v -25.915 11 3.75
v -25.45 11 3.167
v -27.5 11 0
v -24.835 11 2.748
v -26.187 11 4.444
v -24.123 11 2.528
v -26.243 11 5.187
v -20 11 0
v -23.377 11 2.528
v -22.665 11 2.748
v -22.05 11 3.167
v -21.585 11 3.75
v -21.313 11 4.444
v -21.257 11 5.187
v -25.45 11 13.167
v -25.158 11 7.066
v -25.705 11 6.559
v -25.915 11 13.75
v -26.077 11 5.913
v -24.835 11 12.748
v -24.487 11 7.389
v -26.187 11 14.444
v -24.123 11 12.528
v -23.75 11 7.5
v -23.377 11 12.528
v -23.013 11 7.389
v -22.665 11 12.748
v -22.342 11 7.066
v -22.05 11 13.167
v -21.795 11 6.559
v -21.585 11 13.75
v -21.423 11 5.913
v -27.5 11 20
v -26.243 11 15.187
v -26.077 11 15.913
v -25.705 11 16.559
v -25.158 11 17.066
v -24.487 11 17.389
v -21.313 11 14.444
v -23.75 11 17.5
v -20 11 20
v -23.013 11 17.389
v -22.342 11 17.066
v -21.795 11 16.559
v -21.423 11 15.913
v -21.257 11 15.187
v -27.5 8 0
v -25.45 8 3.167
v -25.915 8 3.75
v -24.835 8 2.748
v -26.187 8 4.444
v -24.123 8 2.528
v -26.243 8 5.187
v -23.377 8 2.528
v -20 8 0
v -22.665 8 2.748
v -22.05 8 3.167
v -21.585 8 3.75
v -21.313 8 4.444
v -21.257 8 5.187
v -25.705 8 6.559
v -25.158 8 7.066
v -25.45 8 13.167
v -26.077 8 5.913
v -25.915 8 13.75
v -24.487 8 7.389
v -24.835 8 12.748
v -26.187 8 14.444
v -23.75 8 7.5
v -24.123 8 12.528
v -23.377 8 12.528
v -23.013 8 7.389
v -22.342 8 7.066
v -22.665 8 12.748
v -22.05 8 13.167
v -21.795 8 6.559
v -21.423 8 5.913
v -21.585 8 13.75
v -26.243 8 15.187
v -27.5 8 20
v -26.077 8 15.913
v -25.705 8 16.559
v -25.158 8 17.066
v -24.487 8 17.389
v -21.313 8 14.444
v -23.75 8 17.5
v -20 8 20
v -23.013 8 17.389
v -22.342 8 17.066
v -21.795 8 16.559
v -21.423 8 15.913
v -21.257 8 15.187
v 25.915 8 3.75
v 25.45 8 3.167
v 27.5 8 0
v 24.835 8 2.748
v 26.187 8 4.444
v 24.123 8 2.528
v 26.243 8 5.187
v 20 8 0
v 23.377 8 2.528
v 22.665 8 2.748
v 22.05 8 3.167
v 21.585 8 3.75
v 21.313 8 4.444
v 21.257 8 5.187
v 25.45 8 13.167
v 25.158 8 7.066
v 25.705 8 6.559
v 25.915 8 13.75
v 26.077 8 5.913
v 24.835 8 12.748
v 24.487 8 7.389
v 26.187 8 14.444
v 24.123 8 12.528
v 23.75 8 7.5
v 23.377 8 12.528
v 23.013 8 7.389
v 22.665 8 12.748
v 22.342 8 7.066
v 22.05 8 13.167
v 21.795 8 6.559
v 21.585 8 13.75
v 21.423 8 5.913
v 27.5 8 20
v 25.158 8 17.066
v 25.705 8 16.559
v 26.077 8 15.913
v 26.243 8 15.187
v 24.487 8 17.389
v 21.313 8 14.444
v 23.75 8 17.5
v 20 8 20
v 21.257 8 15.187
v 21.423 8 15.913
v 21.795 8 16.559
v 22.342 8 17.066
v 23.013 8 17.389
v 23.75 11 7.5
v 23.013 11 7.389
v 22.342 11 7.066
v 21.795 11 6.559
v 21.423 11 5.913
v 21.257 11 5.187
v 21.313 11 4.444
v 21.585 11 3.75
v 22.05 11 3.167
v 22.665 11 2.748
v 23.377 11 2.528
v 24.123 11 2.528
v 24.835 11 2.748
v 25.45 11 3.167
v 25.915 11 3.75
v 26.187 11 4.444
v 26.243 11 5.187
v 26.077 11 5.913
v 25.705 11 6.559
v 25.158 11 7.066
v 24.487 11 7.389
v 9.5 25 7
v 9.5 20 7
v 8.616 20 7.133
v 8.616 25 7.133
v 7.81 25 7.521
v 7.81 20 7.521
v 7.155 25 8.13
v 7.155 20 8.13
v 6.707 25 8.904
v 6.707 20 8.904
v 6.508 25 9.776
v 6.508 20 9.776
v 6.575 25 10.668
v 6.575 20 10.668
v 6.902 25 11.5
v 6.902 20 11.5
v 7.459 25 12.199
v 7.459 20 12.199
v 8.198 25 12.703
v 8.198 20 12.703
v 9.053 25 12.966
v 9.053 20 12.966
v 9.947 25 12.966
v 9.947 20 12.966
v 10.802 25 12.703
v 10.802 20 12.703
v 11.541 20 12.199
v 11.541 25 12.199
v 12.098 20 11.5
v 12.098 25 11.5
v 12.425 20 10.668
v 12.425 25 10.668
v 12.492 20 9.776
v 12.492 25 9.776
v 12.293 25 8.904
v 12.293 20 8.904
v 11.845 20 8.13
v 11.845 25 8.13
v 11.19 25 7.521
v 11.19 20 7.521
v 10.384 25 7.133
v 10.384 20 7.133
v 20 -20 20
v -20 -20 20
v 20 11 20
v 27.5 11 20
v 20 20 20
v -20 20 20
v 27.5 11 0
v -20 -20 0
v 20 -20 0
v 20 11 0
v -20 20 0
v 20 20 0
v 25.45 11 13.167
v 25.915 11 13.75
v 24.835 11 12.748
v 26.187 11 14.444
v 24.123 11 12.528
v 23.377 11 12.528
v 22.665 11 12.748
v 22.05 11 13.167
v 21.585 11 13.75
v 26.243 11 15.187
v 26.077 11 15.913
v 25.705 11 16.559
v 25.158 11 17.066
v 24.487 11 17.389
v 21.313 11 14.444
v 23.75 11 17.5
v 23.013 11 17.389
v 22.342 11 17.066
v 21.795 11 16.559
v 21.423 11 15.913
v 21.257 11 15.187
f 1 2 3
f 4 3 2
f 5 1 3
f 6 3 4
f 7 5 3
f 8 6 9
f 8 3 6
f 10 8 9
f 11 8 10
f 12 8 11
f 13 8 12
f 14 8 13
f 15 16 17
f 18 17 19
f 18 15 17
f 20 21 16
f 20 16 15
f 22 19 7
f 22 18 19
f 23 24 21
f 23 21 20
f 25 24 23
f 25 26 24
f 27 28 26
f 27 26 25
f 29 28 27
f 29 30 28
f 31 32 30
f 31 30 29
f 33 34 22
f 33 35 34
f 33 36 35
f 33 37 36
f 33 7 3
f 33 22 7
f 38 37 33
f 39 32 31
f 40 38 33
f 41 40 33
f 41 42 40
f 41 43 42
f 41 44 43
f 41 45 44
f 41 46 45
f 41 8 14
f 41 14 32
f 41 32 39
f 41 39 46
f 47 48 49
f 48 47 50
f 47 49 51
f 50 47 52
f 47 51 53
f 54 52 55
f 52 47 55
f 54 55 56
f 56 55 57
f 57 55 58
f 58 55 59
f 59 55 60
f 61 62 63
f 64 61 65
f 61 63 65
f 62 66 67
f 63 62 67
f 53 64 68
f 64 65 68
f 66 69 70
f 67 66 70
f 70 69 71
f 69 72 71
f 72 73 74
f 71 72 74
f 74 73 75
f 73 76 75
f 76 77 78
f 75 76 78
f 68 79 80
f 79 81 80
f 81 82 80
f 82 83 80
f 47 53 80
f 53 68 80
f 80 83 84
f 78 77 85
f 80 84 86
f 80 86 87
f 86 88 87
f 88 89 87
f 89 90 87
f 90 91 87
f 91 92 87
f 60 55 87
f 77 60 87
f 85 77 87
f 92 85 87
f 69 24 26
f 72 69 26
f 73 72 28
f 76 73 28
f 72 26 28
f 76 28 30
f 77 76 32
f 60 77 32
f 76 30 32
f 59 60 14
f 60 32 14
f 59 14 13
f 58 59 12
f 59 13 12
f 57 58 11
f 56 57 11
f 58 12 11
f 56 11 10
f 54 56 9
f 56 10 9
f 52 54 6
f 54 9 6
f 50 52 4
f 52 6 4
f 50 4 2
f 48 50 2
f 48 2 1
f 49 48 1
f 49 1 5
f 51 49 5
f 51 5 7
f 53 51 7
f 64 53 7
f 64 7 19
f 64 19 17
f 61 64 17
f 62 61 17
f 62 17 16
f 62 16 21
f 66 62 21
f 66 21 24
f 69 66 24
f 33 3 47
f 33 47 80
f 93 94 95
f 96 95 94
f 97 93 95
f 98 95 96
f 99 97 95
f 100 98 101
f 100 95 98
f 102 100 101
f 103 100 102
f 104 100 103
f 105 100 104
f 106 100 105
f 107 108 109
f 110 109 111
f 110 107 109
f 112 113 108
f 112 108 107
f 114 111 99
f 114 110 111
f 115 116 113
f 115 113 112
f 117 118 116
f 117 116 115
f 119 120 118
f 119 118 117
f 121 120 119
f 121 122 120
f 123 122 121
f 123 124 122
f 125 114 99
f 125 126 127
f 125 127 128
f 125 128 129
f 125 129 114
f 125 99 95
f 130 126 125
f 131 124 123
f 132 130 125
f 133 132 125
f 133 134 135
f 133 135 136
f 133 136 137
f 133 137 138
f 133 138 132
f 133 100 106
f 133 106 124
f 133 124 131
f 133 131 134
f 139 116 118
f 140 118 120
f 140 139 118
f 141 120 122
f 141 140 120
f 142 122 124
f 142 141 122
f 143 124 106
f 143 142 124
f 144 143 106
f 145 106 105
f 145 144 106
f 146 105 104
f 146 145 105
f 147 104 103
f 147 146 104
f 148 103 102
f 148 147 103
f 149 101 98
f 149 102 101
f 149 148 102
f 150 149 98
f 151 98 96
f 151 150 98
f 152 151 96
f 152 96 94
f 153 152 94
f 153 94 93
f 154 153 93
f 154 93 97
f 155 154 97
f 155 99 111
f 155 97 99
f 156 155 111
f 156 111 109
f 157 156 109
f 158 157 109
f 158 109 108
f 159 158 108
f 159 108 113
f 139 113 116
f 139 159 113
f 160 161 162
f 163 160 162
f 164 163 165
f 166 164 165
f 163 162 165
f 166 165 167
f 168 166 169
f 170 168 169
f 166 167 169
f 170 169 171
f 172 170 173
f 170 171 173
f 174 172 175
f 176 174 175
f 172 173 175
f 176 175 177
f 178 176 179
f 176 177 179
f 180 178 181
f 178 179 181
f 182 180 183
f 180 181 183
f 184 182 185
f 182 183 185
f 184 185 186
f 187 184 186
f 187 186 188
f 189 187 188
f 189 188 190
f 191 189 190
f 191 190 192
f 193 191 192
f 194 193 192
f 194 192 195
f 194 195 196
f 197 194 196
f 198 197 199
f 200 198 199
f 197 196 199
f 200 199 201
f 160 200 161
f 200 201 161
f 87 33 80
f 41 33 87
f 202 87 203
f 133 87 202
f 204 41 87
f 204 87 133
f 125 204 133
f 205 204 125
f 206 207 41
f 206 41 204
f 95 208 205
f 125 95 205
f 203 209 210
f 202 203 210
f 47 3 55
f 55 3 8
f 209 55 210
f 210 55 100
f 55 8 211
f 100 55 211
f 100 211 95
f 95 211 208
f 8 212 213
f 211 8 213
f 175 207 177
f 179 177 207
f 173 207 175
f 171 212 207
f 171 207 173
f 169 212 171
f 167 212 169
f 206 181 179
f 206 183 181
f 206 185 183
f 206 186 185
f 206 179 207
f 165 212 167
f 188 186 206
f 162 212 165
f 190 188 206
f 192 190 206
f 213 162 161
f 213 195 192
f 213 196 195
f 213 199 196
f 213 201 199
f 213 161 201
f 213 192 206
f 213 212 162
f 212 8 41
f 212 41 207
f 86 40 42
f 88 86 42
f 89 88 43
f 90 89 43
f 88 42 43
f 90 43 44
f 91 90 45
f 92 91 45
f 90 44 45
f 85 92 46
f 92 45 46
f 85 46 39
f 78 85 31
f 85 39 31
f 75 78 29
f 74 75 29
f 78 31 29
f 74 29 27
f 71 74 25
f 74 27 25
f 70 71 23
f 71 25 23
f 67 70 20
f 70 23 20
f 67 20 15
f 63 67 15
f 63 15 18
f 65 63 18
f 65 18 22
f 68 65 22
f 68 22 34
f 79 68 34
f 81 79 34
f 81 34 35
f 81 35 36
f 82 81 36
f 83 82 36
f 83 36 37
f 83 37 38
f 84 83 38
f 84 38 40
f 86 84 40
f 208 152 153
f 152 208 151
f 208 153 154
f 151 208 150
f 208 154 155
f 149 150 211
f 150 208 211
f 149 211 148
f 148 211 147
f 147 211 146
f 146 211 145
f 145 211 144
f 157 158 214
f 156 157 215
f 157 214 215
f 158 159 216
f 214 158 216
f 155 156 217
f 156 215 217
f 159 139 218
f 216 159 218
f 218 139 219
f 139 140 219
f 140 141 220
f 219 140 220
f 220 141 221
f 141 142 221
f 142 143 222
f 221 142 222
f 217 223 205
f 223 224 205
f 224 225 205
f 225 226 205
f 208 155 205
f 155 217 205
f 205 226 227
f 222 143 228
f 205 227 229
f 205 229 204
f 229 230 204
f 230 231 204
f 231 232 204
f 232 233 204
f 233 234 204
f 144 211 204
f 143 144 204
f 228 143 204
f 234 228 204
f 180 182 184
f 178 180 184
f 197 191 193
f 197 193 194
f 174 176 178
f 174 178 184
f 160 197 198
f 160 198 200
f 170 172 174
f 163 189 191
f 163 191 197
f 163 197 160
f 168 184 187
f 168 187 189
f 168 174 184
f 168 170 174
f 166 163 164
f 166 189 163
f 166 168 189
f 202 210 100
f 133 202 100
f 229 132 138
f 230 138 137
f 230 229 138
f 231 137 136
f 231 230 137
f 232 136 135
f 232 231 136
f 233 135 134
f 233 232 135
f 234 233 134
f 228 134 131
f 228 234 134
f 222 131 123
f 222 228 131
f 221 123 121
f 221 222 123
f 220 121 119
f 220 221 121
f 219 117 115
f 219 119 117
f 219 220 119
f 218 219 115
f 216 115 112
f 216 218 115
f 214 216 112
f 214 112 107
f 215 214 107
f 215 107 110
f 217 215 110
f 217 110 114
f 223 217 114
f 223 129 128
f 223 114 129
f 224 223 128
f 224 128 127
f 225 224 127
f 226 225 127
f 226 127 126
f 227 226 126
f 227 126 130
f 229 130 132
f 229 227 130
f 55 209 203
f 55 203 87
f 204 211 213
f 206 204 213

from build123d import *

# Parameters (mm, degrees)
SKETCH1_W           = 40
SKETCH1_H           = 40
BOSS_EXTRUDE1_DEPTH = 20
SKETCH2_R           = 3
BOSS_EXTRUDE2_DEPTH = 5
SKETCH3_W           = 20
SKETCH3_H           = 3
BOSS_EXTRUDE3_DEPTH = 7.5
SKETCH4_R           = 2.5
CUT_EXTRUDE1_DEPTH  = 7.5


with BuildPart() as part:
    # Sketch1 → Boss-Extrude1 (new body)
    with BuildSketch(Plane.XY):
        Rectangle(SKETCH1_W, SKETCH1_H)
    extrude(amount=BOSS_EXTRUDE1_DEPTH)

    # Sketch2 → Boss-Extrude2 (add)
    with BuildSketch(Plane(origin=(0, 20, 0), x_dir=(1, 0, 0), z_dir=(0, 1, 0))):
        with Locations(Location((9.5, -10, 0), (0, 0, 90))):
            Circle(SKETCH2_R)
    extrude(amount=BOSS_EXTRUDE2_DEPTH)

    # Sketch3 → Boss-Extrude3 (add)
    with BuildSketch(Plane.ZY.offset(20)):
        with Locations((10, 9.5)):
            Rectangle(SKETCH3_W, SKETCH3_H)
    boss_extrude3 = extrude(amount=BOSS_EXTRUDE3_DEPTH)

    # Sketch4 → Cut-Extrude1 (cut)
    with BuildSketch(Plane(origin=(0, 11, 0), x_dir=(1, 0, 0), z_dir=(0, 1, 0))):
        with Locations(Location((-23.75, -5, 0), (0, 0, 270))):
            Circle(SKETCH4_R)
        with Locations(Location((-23.75, -15, 0), (0, 0, 270))):
            Circle(SKETCH4_R)
    cut_extrude1 = extrude(amount=-CUT_EXTRUDE1_DEPTH, mode=Mode.SUBTRACT)

    # Mirror1: Boss-Extrude3, Cut-Extrude1 across plane
    add(boss_extrude3.mirror(Plane(origin=(0, 0, 0), x_dir=(0, 0, 1), z_dir=(1, 0, 0))))
    add(cut_extrude1.mirror(Plane(origin=(0, 0, 0), x_dir=(0, 0, 1), z_dir=(1, 0, 0))), mode=Mode.SUBTRACT)


solid = part.part
